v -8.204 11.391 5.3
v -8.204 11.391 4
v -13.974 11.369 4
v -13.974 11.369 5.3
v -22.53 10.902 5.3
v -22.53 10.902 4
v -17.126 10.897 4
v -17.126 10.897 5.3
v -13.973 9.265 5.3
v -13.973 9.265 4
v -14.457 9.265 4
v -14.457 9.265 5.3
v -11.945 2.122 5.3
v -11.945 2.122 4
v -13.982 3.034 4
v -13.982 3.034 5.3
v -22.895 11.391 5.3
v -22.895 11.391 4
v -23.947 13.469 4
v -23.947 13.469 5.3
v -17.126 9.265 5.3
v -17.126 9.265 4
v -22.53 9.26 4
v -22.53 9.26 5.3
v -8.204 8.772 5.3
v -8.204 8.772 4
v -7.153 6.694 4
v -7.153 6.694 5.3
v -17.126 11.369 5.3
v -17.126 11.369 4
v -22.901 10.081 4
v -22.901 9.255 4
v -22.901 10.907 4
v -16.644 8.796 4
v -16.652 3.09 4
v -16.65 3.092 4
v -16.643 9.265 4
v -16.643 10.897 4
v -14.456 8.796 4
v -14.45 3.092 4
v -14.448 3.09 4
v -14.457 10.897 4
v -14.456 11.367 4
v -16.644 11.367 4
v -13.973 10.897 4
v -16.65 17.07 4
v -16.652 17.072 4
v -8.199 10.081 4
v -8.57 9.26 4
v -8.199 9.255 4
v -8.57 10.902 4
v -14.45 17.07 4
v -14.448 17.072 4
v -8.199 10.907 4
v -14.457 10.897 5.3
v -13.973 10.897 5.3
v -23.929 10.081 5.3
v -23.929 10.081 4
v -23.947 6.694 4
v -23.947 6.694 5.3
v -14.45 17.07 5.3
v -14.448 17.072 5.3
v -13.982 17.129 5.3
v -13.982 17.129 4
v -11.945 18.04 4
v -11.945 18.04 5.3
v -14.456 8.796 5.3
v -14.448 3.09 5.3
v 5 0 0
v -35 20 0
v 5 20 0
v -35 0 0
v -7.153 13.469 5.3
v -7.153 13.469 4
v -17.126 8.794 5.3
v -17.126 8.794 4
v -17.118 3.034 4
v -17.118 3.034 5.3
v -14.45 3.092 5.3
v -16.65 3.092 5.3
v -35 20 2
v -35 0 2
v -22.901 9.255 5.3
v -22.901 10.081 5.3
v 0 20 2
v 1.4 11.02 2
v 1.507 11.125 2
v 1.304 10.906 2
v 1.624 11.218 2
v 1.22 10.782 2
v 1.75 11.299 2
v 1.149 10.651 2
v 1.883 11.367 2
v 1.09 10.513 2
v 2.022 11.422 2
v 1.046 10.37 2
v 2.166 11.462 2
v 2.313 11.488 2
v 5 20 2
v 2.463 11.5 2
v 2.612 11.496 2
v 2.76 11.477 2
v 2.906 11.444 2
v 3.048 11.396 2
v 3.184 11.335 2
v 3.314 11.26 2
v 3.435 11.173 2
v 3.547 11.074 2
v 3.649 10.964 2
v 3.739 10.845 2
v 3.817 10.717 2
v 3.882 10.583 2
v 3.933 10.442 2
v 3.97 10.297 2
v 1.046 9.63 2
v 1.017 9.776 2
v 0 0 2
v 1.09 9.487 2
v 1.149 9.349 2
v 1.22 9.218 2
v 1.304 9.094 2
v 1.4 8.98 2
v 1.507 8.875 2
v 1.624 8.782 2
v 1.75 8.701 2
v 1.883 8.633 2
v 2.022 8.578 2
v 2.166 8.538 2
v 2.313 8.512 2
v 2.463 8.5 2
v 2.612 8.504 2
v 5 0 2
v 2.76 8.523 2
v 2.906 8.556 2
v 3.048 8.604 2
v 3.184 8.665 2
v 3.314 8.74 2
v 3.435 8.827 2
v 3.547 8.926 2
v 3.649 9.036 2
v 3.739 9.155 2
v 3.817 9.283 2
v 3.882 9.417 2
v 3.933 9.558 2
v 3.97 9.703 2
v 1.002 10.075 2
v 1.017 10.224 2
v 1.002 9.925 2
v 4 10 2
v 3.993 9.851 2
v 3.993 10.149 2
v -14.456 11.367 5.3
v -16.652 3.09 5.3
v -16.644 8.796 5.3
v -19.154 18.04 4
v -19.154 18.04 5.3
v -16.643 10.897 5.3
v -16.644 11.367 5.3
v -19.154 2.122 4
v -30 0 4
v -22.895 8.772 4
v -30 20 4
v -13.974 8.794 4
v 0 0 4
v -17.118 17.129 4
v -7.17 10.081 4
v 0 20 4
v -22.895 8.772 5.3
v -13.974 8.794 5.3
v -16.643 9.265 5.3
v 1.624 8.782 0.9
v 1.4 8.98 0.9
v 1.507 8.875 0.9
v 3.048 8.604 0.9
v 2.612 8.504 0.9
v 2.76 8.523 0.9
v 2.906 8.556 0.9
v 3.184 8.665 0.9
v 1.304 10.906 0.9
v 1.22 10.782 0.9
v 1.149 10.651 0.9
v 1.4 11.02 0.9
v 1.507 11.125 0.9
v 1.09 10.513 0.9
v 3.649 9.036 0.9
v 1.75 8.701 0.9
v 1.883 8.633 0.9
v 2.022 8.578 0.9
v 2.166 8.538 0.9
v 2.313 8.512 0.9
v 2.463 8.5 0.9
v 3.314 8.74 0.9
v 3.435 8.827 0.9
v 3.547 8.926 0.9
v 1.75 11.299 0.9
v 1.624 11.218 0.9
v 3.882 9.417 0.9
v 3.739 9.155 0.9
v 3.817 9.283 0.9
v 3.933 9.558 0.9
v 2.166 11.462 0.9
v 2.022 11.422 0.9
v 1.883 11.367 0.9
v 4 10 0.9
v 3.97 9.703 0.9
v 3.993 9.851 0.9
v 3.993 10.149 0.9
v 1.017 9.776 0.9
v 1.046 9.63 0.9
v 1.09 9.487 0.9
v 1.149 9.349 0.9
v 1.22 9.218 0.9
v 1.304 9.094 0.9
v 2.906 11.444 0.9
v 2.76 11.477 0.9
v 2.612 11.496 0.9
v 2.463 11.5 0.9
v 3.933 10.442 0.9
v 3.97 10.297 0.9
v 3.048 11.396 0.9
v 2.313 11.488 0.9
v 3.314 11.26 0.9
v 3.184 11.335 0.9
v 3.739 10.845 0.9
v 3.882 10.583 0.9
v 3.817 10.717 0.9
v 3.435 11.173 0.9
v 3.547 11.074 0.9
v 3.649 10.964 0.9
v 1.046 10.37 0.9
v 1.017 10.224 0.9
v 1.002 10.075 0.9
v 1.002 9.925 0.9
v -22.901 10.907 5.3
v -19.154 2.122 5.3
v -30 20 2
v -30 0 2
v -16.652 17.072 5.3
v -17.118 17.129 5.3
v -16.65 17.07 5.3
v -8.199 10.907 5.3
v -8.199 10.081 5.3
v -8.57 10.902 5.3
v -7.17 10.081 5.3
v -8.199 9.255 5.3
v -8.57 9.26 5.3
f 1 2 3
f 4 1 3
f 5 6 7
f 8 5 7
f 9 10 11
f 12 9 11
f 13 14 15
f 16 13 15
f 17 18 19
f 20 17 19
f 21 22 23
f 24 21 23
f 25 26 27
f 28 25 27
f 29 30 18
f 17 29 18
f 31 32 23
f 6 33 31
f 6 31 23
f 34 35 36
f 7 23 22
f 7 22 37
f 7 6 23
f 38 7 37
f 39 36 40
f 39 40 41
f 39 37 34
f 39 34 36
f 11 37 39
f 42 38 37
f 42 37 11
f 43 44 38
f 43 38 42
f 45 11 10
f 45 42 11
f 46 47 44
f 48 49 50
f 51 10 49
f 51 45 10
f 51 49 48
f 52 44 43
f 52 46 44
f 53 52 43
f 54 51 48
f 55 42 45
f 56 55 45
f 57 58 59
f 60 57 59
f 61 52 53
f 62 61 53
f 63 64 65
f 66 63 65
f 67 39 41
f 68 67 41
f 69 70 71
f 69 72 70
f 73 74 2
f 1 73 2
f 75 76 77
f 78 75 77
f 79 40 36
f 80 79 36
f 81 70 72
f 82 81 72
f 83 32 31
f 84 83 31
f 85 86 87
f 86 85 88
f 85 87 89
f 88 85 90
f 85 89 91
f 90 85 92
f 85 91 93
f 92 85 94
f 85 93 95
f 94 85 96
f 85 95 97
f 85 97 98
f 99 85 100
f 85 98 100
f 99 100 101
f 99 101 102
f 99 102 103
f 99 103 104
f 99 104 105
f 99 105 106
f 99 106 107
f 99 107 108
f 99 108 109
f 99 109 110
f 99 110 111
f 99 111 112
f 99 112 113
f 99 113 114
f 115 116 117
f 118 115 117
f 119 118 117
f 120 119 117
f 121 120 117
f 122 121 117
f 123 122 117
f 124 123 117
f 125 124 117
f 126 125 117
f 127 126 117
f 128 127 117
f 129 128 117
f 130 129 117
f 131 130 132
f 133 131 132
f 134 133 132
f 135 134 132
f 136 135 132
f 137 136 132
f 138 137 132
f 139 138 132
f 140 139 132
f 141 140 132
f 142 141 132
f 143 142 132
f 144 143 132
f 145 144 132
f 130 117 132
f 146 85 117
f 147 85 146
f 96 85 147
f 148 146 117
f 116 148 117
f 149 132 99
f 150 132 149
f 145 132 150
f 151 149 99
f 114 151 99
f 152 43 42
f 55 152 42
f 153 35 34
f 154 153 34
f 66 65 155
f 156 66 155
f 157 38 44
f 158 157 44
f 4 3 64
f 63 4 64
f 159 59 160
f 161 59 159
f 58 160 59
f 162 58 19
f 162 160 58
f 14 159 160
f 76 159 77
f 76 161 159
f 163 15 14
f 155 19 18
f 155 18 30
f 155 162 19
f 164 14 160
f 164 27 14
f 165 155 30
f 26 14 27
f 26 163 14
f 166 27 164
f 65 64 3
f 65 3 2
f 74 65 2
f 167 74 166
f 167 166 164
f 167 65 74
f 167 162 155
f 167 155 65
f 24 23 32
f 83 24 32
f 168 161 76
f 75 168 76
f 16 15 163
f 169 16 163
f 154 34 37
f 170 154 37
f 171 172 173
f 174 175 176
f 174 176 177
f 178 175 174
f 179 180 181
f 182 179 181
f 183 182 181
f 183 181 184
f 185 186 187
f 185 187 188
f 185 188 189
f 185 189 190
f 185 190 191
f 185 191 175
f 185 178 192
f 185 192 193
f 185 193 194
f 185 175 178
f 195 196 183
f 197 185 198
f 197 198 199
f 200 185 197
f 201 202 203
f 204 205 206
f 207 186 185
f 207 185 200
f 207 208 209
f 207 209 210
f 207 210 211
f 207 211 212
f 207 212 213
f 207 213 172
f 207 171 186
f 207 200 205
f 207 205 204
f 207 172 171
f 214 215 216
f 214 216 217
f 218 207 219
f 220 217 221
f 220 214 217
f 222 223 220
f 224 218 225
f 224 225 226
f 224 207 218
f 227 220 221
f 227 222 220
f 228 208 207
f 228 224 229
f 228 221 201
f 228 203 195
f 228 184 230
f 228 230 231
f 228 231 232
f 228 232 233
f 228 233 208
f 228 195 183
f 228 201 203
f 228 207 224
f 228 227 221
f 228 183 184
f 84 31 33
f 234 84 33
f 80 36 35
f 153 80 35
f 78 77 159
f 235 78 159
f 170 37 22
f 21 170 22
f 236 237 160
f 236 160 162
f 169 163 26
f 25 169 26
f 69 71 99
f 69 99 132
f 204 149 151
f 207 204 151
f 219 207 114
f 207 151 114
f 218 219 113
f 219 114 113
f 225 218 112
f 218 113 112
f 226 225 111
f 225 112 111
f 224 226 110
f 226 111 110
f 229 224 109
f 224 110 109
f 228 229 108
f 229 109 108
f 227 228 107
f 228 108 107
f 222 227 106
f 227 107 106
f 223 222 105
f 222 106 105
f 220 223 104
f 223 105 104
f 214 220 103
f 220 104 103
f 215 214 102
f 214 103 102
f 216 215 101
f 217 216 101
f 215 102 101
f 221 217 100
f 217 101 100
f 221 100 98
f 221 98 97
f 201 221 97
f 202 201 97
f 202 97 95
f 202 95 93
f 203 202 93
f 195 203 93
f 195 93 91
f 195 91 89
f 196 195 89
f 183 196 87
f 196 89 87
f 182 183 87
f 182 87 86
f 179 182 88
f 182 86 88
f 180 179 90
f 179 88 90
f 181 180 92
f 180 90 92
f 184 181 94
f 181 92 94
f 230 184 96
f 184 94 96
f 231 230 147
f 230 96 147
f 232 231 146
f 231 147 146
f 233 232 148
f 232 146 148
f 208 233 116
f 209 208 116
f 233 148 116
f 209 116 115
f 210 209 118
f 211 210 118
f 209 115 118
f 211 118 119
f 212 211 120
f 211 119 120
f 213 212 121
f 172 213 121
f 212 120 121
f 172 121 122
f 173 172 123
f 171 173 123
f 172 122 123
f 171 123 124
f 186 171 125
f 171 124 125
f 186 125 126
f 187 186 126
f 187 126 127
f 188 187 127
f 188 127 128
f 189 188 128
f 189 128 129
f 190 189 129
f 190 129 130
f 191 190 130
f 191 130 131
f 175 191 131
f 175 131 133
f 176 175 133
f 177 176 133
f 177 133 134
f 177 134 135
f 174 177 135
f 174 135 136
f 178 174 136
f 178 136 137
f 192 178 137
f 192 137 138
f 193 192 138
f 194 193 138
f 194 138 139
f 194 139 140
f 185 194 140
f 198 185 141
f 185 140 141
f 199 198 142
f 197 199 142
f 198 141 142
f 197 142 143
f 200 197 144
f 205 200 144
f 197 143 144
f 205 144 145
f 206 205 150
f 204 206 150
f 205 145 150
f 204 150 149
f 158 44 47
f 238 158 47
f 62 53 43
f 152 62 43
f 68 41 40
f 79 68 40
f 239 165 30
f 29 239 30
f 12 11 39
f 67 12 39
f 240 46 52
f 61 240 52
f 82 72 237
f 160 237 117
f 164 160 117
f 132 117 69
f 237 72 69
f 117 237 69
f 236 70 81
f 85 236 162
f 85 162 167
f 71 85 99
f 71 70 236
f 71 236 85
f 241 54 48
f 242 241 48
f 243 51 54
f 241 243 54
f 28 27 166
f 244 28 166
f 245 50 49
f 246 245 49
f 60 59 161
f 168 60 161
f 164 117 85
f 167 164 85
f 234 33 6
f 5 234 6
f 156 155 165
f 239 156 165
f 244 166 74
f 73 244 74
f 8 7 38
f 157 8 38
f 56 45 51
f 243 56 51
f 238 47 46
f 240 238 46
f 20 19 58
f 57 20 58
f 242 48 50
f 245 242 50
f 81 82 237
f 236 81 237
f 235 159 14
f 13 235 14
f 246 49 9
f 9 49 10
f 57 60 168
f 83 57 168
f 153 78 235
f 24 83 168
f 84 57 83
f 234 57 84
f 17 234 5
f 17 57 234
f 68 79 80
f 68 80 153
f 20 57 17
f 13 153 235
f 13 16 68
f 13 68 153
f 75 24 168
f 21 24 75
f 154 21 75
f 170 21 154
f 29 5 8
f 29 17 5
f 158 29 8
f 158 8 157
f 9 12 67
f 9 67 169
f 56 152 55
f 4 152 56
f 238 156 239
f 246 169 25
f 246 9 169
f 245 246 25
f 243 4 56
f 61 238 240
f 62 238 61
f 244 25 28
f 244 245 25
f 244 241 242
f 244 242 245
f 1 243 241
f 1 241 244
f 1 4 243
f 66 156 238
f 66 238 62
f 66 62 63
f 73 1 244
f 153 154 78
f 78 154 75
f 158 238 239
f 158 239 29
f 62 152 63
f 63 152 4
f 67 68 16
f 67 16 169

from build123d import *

# Parameters (mm, degrees)
F0_W     = 30
F0_H     = 20
F1_DEPTH = 4
F2_W     = 5
F2_H     = 20
F3_DEPTH = 2
F5_DEPTH = 1.3
F6_W     = 5
F6_H     = 20
F7_DEPTH = 2
F8_R     = 1.5
F9_DEPTH = 1.1


with BuildPart() as f1:
    # F0 (on Top) → F1 (new body)
    with BuildSketch(Plane.XY):
        with Locations((-15, 10)):
            Rectangle(F0_W, F0_H)
    extrude(amount=F1_DEPTH)

    # F2 (on face) → F3 (join)
    with BuildSketch(Plane(origin=(0, 0, 0), x_dir=(1, 0, 0), z_dir=(0, 0, -1))):
        with Locations((-32.5, -10)):
            Rectangle(F2_W, F2_H)
    extrude(amount=-F3_DEPTH)

    # F4 (on face) → F5 (join)
    with BuildSketch(Plane.XY.offset(4)):
        Polygon((-14.4567919296, 10.897058451), (-13.9734713034, 10.8974938178), (-13.9741291965, 11.3685017389), (-14.4561063498, 11.3666541874), align=None)
        Polygon((-13.9741291965, 11.3685017389), (-13.9734713034, 10.8974938178), (-8.5701756179, 10.902361013), (-8.198968805, 10.9070869228), (-8.1985752936, 10.0812381133), (-8.198968805, 9.2553893039), (-8.5701756179, 9.2601152137), (-13.9734713034, 9.2649824089), (-13.9741291965, 8.7939744878), (-8.2043278962, 8.7718572468), (-7.1527287364, 6.6936984658), (-7.1703906207, 10.0812381133), (-7.1527287364, 13.4687777609), (-8.2043278962, 11.3906189799), align=None)
        Polygon((-14.4561063498, 11.3666541874), (-13.9741291965, 11.3685017389), (-13.9821750256, 17.1287826718), (-11.9453166755, 18.0399830909), (-15.5499000102, 18.0399830909), (-19.1544833449, 18.0399830909), (-17.1176249949, 17.1287826718), (-17.1256708239, 11.3685017389), (-16.6436936706, 11.3666541874), (-16.6520233348, 17.0721532121), (-16.650039608, 17.0703820259), (-15.5499000102, 17.0703820259), (-14.4497604124, 17.0703820259), (-14.4477766856, 17.0721532121), align=None)
        Polygon((-13.9741291965, 8.7939744878), (-13.9734713034, 9.2649824089), (-14.4567919296, 9.2654177757), (-14.4561063498, 8.7958220392), align=None)
        Polygon((-16.6436936706, 11.3666541874), (-17.1256708239, 11.3685017389), (-17.1263287171, 10.8974938178), (-16.6430080908, 10.897058451), align=None)
        Polygon((-17.1263287171, 10.8974938178), (-17.1256708239, 11.3685017389), (-22.8954721242, 11.3906189799), (-23.9470712841, 13.4687777609), (-23.9294093997, 10.0812381133), (-23.9470712841, 6.6936984658), (-22.8954721242, 8.7718572468), (-17.1256708239, 8.7939744878), (-17.1263287171, 9.2649824089), (-22.5296244025, 9.2601152137), (-22.9008312154, 9.2553893039), (-22.9012247269, 10.0812381133), (-22.9008312154, 10.9070869228), (-22.5296244025, 10.902361013), align=None)
        Polygon((-13.9821750256, 3.0336935549), (-13.9741291965, 8.7939744878), (-14.4561063498, 8.7958220392), (-14.4477766856, 3.0903230146), (-14.4497604124, 3.0920942008), (-15.5499000102, 3.0920942008), (-16.650039608, 3.0920942008), (-16.6520233348, 3.0903230146), (-16.6436936706, 8.7958220392), (-17.1256708239, 8.7939744878), (-17.1176249949, 3.0336935549), (-19.1544833449, 2.1224931358), (-15.5499000102, 2.1224931358), (-11.9453166755, 2.1224931358), align=None)
        Polygon((-17.1263287171, 9.2649824089), (-17.1256708239, 8.7939744878), (-16.6436936706, 8.7958220392), (-16.6430080908, 9.2654177757), align=None)
    extrude(amount=F5_DEPTH)

    # F6 (on face) → F7 (join)
    with BuildSketch(Plane(origin=(0, 0, 0), x_dir=(1, 0, 0), z_dir=(0, 0, -1))):
        with Locations((2.5, -10)):
            Rectangle(F6_W, F6_H)
    extrude(amount=-F7_DEPTH)

    # F8 (on face) → F9 (cut)
    with BuildSketch(Plane.XY.offset(2)):
        with Locations((2.5, 10)):
            Circle(F8_R)
    extrude(amount=-F9_DEPTH, mode=Mode.SUBTRACT)


solid = f1.part
